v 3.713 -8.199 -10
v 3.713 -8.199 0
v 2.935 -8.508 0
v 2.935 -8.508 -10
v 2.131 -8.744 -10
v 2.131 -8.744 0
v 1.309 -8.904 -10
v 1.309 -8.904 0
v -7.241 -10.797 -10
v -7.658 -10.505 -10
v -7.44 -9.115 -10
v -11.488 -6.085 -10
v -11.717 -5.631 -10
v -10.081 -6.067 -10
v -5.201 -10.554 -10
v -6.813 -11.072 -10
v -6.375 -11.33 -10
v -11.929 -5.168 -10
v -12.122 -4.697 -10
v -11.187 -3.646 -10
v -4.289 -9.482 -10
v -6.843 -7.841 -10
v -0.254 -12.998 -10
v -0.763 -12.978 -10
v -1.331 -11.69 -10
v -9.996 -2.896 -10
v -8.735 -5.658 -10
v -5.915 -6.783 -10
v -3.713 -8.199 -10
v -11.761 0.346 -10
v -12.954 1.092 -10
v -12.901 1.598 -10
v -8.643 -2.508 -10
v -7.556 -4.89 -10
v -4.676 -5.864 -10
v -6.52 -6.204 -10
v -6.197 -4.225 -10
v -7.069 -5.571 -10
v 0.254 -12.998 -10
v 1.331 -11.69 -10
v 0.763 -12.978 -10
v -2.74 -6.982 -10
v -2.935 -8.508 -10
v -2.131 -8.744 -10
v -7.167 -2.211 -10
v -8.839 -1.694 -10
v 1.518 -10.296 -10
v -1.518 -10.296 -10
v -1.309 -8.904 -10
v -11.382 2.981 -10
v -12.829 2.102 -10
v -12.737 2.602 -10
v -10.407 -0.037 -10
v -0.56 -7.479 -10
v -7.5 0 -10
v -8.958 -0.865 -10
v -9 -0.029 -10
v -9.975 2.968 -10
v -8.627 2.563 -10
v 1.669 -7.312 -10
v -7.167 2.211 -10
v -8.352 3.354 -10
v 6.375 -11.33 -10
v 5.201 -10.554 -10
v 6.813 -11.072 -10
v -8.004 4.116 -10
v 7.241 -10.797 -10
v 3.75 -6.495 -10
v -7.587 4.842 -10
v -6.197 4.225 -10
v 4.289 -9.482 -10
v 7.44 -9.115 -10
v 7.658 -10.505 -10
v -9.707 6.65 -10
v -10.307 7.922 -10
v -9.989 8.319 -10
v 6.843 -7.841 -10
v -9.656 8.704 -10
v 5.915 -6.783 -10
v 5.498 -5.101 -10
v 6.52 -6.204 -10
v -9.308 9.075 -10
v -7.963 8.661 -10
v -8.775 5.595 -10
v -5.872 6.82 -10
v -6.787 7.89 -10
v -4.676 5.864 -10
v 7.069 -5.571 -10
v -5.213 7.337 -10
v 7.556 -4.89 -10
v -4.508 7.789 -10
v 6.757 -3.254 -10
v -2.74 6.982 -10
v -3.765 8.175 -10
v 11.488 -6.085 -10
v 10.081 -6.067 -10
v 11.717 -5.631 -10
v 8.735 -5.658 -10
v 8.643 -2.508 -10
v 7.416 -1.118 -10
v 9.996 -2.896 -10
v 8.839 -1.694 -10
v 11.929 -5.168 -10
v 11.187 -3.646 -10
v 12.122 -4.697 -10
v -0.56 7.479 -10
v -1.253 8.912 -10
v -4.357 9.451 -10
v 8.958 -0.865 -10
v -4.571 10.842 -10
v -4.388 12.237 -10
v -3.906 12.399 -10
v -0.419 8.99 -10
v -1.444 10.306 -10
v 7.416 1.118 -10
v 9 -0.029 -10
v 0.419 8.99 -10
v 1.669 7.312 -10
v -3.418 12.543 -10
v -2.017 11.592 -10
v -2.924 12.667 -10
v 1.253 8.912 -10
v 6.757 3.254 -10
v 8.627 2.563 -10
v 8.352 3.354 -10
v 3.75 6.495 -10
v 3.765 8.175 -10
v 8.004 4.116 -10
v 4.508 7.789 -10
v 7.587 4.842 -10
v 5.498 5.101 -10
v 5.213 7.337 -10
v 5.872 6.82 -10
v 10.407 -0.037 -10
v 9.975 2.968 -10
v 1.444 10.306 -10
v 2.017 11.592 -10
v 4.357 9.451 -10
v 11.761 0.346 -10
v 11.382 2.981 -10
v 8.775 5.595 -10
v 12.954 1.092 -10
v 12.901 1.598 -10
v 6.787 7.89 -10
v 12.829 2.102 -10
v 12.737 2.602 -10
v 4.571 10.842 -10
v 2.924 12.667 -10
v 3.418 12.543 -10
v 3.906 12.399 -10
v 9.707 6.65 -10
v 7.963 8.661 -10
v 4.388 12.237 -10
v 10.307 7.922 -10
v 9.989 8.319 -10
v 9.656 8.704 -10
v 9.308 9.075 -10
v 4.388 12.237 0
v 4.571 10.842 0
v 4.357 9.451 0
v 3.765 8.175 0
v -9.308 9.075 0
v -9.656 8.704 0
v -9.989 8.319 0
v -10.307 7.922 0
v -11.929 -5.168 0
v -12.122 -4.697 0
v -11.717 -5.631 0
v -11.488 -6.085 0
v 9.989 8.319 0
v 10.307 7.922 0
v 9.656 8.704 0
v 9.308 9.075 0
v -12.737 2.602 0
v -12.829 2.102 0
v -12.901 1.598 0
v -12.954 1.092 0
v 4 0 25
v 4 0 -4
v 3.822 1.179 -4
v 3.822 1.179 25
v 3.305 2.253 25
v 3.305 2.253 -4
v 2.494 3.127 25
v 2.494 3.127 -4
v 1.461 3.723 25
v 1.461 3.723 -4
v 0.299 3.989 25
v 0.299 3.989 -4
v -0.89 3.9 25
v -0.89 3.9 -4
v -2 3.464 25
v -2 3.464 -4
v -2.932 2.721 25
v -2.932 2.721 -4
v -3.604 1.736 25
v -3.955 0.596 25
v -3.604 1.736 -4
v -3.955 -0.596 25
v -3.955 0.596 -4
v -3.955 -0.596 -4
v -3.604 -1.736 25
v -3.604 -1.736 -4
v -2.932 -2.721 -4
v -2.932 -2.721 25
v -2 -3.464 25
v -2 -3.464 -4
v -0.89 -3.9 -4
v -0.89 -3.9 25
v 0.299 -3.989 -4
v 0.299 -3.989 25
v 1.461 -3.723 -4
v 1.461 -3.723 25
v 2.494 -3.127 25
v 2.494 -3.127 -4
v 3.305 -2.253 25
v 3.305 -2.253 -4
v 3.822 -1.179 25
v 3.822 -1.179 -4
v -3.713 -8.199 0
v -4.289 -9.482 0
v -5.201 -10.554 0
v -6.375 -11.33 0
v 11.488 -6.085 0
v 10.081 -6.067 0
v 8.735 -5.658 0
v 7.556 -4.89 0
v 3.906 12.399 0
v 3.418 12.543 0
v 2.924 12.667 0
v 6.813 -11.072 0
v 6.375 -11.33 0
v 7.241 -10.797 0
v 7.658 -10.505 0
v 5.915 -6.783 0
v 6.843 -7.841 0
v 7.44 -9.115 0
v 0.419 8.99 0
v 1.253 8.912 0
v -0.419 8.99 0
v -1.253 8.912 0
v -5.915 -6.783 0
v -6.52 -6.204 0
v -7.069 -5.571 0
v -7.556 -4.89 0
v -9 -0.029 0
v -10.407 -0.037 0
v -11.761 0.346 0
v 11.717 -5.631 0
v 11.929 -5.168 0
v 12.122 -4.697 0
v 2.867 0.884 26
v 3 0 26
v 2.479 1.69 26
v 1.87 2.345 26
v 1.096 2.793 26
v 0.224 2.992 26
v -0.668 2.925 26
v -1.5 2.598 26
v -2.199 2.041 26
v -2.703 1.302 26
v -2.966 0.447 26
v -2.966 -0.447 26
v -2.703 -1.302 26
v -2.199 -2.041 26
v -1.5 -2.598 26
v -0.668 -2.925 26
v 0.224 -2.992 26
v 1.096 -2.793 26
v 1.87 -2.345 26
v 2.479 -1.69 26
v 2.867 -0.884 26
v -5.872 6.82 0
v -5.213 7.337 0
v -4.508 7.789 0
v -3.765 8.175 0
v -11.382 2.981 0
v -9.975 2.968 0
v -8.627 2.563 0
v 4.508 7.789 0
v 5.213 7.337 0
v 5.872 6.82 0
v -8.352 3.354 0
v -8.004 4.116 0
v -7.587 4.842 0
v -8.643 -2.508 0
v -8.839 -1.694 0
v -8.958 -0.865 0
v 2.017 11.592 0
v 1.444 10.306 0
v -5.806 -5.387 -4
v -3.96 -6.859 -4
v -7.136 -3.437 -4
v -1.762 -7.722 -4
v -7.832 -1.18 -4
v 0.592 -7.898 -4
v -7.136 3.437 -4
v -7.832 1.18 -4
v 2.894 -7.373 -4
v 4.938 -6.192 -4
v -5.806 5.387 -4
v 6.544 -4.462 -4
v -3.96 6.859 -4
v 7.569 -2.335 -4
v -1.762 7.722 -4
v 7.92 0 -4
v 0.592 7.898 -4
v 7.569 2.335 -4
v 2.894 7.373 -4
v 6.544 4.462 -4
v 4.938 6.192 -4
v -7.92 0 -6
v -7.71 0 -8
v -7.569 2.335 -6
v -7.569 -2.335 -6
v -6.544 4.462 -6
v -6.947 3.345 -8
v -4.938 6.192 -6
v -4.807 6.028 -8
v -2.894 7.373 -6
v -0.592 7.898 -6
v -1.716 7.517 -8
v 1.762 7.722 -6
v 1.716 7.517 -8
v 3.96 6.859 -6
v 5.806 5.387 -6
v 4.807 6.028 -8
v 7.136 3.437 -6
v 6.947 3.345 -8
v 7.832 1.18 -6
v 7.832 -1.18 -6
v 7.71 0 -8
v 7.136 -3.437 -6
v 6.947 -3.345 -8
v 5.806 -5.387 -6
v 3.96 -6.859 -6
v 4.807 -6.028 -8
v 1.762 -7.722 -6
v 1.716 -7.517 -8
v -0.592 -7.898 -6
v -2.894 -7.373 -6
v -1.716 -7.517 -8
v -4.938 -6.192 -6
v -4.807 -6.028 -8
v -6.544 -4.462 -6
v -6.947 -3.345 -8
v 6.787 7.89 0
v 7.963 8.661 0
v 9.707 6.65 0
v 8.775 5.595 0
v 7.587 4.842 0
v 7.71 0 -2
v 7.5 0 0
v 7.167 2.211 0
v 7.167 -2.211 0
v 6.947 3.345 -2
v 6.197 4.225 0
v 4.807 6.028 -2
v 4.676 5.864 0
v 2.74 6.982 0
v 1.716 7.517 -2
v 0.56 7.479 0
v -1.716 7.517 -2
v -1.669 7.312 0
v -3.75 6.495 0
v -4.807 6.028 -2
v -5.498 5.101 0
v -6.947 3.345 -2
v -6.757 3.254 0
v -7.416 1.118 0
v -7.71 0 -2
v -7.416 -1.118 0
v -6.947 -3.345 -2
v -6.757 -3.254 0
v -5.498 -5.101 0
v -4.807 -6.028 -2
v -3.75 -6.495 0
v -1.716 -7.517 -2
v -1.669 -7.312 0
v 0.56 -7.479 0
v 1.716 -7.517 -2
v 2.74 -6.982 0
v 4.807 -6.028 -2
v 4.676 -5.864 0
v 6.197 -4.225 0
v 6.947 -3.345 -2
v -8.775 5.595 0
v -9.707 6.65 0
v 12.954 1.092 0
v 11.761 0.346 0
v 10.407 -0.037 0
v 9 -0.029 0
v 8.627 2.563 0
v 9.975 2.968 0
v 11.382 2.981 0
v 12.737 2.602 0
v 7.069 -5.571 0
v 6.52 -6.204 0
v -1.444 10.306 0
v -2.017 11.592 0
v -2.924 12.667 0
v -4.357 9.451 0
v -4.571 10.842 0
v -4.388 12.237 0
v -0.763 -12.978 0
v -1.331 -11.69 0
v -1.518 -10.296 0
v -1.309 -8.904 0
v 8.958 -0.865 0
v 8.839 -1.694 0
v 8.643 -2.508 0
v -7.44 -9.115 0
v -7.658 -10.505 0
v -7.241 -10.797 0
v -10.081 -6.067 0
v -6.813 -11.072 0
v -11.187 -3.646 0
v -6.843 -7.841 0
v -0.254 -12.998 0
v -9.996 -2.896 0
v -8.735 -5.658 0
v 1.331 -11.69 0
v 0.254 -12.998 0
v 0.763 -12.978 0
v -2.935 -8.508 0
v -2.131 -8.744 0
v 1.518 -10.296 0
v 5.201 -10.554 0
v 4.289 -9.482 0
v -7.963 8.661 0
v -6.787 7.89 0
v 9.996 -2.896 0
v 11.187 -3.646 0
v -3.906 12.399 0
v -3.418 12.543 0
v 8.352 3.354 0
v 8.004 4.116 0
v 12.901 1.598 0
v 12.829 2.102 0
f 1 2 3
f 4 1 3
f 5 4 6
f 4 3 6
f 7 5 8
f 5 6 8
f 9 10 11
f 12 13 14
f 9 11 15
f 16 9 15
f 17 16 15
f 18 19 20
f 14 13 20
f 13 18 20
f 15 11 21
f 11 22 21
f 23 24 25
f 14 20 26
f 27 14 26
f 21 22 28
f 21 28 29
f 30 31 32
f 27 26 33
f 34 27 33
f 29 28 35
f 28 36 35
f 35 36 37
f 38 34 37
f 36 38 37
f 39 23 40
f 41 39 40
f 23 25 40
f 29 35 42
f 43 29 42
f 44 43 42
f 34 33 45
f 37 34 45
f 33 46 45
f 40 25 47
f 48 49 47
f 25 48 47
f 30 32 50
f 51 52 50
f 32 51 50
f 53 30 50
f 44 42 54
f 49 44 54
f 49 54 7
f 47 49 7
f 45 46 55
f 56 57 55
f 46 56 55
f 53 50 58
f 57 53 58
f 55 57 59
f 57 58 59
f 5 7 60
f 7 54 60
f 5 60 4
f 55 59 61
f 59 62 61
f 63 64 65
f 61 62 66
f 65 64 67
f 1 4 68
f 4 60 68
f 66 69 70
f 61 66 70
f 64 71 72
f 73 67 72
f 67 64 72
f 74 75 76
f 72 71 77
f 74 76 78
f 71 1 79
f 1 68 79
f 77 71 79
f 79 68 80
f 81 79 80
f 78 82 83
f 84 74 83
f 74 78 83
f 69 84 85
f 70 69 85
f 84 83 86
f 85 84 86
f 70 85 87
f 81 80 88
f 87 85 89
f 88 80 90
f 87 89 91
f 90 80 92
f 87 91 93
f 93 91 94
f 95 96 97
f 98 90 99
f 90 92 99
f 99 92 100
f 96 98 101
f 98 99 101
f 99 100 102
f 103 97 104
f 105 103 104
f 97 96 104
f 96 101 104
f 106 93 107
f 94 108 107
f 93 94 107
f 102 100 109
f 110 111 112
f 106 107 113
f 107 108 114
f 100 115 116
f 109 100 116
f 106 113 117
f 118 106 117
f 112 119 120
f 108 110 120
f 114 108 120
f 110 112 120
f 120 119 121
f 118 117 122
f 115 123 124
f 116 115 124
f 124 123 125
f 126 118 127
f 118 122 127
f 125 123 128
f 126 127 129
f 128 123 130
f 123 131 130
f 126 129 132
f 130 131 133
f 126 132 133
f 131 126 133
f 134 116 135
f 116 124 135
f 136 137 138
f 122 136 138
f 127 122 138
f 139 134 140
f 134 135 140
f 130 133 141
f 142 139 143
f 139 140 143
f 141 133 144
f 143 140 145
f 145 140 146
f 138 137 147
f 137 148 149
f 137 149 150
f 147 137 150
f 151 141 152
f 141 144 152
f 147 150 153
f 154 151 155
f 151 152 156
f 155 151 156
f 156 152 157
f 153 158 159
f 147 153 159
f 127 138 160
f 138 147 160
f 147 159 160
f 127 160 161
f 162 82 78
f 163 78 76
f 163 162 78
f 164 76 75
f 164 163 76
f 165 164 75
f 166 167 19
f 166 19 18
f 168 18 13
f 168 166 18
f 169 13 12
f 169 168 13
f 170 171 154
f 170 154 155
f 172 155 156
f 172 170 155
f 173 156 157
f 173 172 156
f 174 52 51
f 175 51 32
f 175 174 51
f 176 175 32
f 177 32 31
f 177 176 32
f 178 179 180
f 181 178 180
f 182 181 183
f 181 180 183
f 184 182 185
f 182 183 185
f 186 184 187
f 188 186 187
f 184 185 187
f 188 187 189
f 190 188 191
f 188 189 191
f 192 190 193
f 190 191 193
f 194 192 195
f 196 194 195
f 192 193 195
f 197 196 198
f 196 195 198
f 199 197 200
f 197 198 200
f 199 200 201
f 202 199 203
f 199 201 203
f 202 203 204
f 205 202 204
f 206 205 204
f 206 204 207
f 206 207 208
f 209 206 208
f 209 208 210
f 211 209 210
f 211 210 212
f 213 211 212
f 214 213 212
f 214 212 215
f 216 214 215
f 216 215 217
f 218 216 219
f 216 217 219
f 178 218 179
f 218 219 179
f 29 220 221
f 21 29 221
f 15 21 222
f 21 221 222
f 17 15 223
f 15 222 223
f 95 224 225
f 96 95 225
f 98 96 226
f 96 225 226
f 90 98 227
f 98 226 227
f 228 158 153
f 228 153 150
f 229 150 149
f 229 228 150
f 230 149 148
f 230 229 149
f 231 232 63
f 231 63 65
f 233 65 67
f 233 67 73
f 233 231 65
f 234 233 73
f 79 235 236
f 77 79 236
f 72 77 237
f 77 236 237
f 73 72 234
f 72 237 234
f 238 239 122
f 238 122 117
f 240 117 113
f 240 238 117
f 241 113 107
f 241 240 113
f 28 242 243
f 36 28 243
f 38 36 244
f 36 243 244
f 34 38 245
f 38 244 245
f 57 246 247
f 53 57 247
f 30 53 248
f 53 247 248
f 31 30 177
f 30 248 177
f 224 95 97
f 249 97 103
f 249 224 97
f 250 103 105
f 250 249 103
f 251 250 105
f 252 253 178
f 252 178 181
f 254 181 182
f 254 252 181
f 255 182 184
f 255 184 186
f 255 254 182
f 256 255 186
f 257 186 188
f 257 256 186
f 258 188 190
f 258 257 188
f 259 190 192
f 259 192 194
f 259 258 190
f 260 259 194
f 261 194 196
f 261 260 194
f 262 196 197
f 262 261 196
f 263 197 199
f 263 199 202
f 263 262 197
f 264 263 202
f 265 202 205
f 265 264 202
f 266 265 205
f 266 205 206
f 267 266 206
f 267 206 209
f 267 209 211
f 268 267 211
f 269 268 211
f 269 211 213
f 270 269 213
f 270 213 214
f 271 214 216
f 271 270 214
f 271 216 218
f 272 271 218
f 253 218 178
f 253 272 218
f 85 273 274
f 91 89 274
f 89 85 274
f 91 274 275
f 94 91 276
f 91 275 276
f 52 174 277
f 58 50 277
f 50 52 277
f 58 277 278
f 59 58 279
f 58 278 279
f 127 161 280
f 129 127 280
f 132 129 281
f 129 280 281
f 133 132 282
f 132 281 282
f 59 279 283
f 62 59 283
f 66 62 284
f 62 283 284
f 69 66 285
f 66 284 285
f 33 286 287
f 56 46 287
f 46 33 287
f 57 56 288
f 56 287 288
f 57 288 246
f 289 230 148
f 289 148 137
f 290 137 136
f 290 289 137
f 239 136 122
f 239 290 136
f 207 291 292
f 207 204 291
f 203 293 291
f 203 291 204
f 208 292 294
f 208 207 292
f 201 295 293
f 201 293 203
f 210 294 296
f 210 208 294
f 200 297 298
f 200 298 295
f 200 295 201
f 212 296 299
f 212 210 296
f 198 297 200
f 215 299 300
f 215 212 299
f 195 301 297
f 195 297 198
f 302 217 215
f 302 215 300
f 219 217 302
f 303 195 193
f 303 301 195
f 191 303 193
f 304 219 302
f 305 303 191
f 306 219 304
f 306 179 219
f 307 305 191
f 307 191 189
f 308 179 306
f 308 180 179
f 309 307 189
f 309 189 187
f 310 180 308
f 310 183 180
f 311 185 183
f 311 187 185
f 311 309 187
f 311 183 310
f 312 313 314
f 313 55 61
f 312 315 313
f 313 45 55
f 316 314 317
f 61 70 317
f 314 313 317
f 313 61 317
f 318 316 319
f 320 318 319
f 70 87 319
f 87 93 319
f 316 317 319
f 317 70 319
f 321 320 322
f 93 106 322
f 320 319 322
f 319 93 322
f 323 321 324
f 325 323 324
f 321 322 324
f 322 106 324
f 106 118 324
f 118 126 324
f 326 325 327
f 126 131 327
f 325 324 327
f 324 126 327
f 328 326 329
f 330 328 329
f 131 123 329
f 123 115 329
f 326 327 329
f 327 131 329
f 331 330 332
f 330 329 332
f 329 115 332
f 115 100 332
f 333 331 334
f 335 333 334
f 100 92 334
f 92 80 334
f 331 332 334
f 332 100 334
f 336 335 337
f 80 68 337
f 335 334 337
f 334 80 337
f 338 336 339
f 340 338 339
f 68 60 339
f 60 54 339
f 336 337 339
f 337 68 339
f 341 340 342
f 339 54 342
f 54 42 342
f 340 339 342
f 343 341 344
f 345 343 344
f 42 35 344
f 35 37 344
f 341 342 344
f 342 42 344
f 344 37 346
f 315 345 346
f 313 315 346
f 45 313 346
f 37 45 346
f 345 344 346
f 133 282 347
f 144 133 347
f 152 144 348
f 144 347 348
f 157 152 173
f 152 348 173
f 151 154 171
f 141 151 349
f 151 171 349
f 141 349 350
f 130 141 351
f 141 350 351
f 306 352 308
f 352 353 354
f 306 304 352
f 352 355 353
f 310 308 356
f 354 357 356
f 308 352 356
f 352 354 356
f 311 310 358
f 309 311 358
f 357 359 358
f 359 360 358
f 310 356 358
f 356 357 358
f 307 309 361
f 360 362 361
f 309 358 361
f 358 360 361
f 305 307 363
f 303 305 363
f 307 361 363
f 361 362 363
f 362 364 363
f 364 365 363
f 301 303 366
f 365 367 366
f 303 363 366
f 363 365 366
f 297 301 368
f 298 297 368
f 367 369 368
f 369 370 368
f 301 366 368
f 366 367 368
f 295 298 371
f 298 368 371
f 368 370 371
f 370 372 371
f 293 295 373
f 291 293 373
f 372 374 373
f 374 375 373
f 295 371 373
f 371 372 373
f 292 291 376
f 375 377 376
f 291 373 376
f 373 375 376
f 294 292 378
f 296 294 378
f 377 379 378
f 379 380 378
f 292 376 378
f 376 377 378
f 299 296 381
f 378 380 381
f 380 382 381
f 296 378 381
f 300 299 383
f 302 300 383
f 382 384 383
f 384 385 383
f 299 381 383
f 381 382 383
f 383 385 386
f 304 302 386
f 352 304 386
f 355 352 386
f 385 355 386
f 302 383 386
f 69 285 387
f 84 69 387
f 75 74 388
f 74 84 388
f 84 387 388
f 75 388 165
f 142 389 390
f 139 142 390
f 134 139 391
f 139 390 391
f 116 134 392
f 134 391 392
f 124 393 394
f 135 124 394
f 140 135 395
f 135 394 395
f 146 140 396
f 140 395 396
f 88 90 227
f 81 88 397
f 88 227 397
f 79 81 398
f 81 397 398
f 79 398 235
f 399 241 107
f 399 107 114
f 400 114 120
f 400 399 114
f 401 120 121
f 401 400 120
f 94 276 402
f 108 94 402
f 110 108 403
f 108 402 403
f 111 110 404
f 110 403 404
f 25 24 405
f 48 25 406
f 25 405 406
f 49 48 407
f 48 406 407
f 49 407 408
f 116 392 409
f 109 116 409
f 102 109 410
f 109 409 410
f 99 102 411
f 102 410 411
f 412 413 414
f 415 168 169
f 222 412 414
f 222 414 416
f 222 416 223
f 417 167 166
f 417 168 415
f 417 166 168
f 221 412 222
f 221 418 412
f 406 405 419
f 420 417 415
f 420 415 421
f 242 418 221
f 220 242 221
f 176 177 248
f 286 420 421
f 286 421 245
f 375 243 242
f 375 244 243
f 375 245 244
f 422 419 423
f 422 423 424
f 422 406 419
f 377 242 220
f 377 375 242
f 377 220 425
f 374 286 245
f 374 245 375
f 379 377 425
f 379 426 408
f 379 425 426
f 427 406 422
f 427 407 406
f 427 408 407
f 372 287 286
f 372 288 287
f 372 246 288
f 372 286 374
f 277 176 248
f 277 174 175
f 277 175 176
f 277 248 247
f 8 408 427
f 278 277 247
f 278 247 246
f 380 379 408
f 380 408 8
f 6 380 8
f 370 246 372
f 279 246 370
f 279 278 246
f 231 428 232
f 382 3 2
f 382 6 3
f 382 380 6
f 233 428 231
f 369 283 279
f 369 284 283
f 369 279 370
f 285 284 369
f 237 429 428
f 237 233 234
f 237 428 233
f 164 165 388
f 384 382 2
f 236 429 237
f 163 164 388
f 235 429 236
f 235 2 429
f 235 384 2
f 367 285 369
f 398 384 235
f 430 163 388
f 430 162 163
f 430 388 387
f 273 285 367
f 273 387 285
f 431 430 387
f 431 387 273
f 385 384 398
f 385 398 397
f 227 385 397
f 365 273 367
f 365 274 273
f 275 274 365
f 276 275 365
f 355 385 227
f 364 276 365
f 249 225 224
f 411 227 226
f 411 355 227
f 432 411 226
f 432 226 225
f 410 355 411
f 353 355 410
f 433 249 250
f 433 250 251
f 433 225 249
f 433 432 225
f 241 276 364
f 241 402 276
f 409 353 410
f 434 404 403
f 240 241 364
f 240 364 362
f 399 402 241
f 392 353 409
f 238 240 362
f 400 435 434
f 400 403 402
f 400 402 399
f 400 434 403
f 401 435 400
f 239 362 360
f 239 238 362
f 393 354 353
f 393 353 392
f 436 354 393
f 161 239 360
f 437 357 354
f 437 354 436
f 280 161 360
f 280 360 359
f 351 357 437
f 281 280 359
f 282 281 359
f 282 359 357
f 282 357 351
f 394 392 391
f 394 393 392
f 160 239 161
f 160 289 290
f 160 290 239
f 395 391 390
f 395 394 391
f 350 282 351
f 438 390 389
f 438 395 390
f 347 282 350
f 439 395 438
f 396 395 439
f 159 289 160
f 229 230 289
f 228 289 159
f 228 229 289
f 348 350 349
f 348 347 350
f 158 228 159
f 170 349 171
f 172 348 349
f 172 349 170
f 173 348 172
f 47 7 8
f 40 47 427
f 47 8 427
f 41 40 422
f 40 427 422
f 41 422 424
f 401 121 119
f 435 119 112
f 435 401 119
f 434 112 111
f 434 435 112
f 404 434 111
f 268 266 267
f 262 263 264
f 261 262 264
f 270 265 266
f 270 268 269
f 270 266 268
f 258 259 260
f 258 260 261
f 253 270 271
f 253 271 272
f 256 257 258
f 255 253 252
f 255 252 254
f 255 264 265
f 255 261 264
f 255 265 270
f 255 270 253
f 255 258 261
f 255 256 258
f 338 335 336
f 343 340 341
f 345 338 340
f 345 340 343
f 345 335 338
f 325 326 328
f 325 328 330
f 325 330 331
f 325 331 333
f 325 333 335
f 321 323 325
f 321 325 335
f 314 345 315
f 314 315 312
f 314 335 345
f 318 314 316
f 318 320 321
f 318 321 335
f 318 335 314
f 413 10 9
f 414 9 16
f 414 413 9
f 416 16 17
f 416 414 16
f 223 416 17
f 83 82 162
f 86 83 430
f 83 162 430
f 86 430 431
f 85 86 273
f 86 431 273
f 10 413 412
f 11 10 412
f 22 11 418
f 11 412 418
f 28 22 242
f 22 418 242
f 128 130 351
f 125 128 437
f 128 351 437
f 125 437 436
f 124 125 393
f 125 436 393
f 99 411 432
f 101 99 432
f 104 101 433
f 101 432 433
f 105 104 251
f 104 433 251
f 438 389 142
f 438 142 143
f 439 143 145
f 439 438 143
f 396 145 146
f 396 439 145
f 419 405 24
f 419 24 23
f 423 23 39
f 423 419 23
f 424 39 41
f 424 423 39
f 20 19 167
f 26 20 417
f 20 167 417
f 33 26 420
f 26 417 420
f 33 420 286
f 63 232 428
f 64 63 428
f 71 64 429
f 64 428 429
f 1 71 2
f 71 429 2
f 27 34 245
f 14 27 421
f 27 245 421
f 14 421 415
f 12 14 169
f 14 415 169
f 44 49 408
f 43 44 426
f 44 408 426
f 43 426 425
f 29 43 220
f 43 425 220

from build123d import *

# Parameters (mm, degrees)
SKETCH_1_R          = 13
EXTRUDE_2_DEPTH     = 10
CUT_EXTRUDE_1_DEPTH = 21.928449536
SKETCH_3_R          = 7.5
CUT_EXTRUDE_2_DEPTH = 4
CUT_EXTRUDE_2_DRAFT = 6
SKETCH_4_R          = 7.5
CUT_EXTRUDE_3_DEPTH = 4
CUT_EXTRUDE_3_DRAFT = 6
SKETCH_5_R          = 4
EXTRUDE_3_DEPTH     = 30
CHAMFER_1_SIZE      = 1


with BuildPart() as part:
    # Эскиз1 → Бобышка-Вытянуть2 (new body)
    with BuildSketch(Plane.XY):
        Circle(SKETCH_1_R)
    extrude(amount=-EXTRUDE_2_DEPTH)

    # Эскиз2 → Вырез-Вытянуть1 (cut, through all)
    with BuildSketch(Plane.XY):
        with BuildLine():
            ThreePointArc((1.252557909, 8.912412619), (0, 9), (-1.252557909, 8.912412619))
            ThreePointArc((-1.252557909, 8.912412619), (-1.684886314, 10.969320472), (-2.924363706, 12.666810842))
            ThreePointArc((-2.924363706, 12.666810842), (0, 13), (2.924363706, 12.666810842))
            ThreePointArc((2.924363706, 12.666810842), (1.684886314, 10.969320472), (1.252557909, 8.912412619))
        make_face()
        with BuildLine():
            ThreePointArc((9.308326268, 9.074968986), (7.028330627, 10.936295927), (4.388063669, 12.237029756))
            ThreePointArc((4.388063669, 12.237029756), (4.513045823, 10.138897913), (3.764695278, 8.174782533))
            ThreePointArc((3.764695278, 8.174782533), (4.865767357, 7.571281795), (5.872132809, 6.82041467))
            ThreePointArc((5.872132809, 6.82041467), (7.34787895, 8.317061286), (9.308326268, 9.074968986))
        make_face()
        with BuildLine():
            ThreePointArc((12.736961008, 2.601888597), (11.82521594, 5.400395169), (10.307311834, 7.922078184))
            ThreePointArc((10.307311834, 7.922078184), (9.278117798, 6.089446906), (7.586684314, 4.841716754))
            ThreePointArc((7.586684314, 4.841716754), (8.186687958, 3.738735117), (8.627347034, 2.562983254))
            ThreePointArc((8.627347034, 2.562983254), (10.677971938, 3.024193907), (12.736961008, 2.601888597))
        make_face()
        with BuildLine():
            ThreePointArc((12.121700624, -4.697273037), (12.867678744, -1.850092898), (12.95406132, 1.091922764))
            ThreePointArc((12.95406132, 1.091922764), (11.097452929, 0.106639531), (8.999954685, -0.028559885))
            ThreePointArc((8.999954685, -0.028559885), (8.908392977, -1.280833544), (8.643439533, -2.508177236))
            ThreePointArc((8.643439533, -2.508177236), (10.617884283, -3.228833669), (12.121700624, -4.697273037))
        make_face()
        with BuildLine():
            ThreePointArc((7.657885939, -10.505083671), (9.824744467, -8.513189541), (11.487987866, -6.084910418))
            ThreePointArc((11.487987866, -6.084910418), (9.393425165, -5.910025141), (7.555803034, -4.889768962))
            ThreePointArc((7.555803034, -4.889768962), (6.801746169, -5.893746606), (5.915301052, -6.783009175))
            ThreePointArc((5.915301052, -6.783009175), (7.186693389, -8.456729369), (7.657885939, -10.505083671))
        make_face()
        with BuildLine():
            ThreePointArc((0.762746577, -12.977604465), (3.662523239, -12.473408657), (6.374559434, -11.329827537))
            ThreePointArc((6.374559434, -11.329827537), (4.707051283, -10.050298589), (3.712737307, -8.198510943))
            ThreePointArc((3.712737307, -8.198510943), (2.535593012, -8.635436763), (1.309096282, -8.904283628))
            ThreePointArc((1.309096282, -8.904283628), (1.473778124, -10.999673247), (0.762746577, -12.977604465))
        make_face()
        with BuildLine():
            ThreePointArc((-6.374559434, -11.329827537), (-3.662523239, -12.473408657), (-0.762746577, -12.977604465))
            ThreePointArc((-0.762746577, -12.977604465), (-1.473778124, -10.999673247), (-1.309096282, -8.904283628))
            ThreePointArc((-1.309096282, -8.904283628), (-2.535593012, -8.635436763), (-3.712737307, -8.198510943))
            ThreePointArc((-3.712737307, -8.198510943), (-4.707051283, -10.050298589), (-6.374559434, -11.329827537))
        make_face()
        with BuildLine():
            ThreePointArc((-11.487987866, -6.084910418), (-9.824744467, -8.513189541), (-7.657885939, -10.505083671))
            ThreePointArc((-7.657885939, -10.505083671), (-7.186693389, -8.456729369), (-5.915301052, -6.783009175))
            ThreePointArc((-5.915301052, -6.783009175), (-6.801746169, -5.893746606), (-7.555803034, -4.889768962))
            ThreePointArc((-7.555803034, -4.889768962), (-9.393425165, -5.910025141), (-11.487987866, -6.084910418))
        make_face()
        with BuildLine():
            ThreePointArc((-12.95406132, 1.091922764), (-12.867678744, -1.850092898), (-12.121700624, -4.697273037))
            ThreePointArc((-12.121700624, -4.697273037), (-10.617884283, -3.228833669), (-8.643439533, -2.508177236))
            ThreePointArc((-8.643439533, -2.508177236), (-8.908392977, -1.280833544), (-8.999954685, -0.028559885))
            ThreePointArc((-8.999954685, -0.028559885), (-11.097452929, 0.106639531), (-12.95406132, 1.091922764))
        make_face()
        with BuildLine():
            ThreePointArc((-10.307311834, 7.922078184), (-11.82521594, 5.400395169), (-12.736961008, 2.601888597))
            ThreePointArc((-12.736961008, 2.601888597), (-10.677971938, 3.024193907), (-8.627347034, 2.562983254))
            ThreePointArc((-8.627347034, 2.562983254), (-8.186687958, 3.738735117), (-7.586684314, 4.841716754))
            ThreePointArc((-7.586684314, 4.841716754), (-9.278117798, 6.089446906), (-10.307311834, 7.922078184))
        make_face()
        with BuildLine():
            ThreePointArc((-4.388063669, 12.237029756), (-7.028330627, 10.936295927), (-9.308326268, 9.074968986))
            ThreePointArc((-9.308326268, 9.074968986), (-7.34787895, 8.317061286), (-5.872132809, 6.82041467))
            ThreePointArc((-5.872132809, 6.82041467), (-4.865767357, 7.571281795), (-3.764695278, 8.174782533))
            ThreePointArc((-3.764695278, 8.174782533), (-4.513045823, 10.138897913), (-4.388063669, 12.237029756))
        make_face()
    extrude(amount=-CUT_EXTRUDE_1_DEPTH, mode=Mode.SUBTRACT)


with BuildPart() as cut_extrude_2_tool:
    # Эскиз3 → Вырез-Вытянуть2 (with draft: the straight prism first)
    with BuildSketch(Plane.XY):
        Circle(SKETCH_3_R)
    extrude(amount=-CUT_EXTRUDE_2_DEPTH)
    # Вырез-Вытянуть2: the draft: its side faces are tilted about the plane it starts from
    cut_extrude_2_sides = [cut_extrude_2_tool.faces().sort_by_distance(p)[0] for p in [
        (-7.5, 0, -2),
    ]]
    draft(cut_extrude_2_sides, Plane.XY, CUT_EXTRUDE_2_DRAFT)


with BuildPart() as part_1:
    add(part.part)

    # Вырез-Вытянуть2: cut by cut_extrude_2_tool
    add(cut_extrude_2_tool.part, mode=Mode.SUBTRACT)


with BuildPart() as cut_extrude_3_tool:
    # Эскиз4 → Вырез-Вытянуть3 (with draft: the straight prism first)
    with BuildSketch(Plane(origin=(0, 0, -10), x_dir=(-1, 0, 0), z_dir=(0, 0, -1))):
        Circle(SKETCH_4_R)
    extrude(amount=-CUT_EXTRUDE_3_DEPTH)
    # Вырез-Вытянуть3: the draft: its side faces are tilted about the plane it starts from
    cut_extrude_3_sides = [cut_extrude_3_tool.faces().sort_by_distance(p)[0] for p in [
        (7.5, 0, -8),
    ]]
    draft(cut_extrude_3_sides, Plane(origin=(0, 0, -10), x_dir=(-1, 0, 0), z_dir=(0, 0, -1)), CUT_EXTRUDE_3_DRAFT)


with BuildPart() as part_2:
    add(part_1.part)

    # Вырез-Вытянуть3: cut by cut_extrude_3_tool
    add(cut_extrude_3_tool.part, mode=Mode.SUBTRACT)

    # Эскиз5 → Бобышка-Вытянуть3 (add)
    with BuildSketch(Plane.XY.offset(-4)):
        Circle(SKETCH_5_R)
    extrude(amount=EXTRUDE_3_DEPTH)

    # Фаска1
    chamfer_1_edges = [part_2.edges().sort_by_distance(p)[0] for p in [
        (-4, 0, 26),
    ]]
    chamfer(chamfer_1_edges, length=CHAMFER_1_SIZE)


solid = part_2.part
